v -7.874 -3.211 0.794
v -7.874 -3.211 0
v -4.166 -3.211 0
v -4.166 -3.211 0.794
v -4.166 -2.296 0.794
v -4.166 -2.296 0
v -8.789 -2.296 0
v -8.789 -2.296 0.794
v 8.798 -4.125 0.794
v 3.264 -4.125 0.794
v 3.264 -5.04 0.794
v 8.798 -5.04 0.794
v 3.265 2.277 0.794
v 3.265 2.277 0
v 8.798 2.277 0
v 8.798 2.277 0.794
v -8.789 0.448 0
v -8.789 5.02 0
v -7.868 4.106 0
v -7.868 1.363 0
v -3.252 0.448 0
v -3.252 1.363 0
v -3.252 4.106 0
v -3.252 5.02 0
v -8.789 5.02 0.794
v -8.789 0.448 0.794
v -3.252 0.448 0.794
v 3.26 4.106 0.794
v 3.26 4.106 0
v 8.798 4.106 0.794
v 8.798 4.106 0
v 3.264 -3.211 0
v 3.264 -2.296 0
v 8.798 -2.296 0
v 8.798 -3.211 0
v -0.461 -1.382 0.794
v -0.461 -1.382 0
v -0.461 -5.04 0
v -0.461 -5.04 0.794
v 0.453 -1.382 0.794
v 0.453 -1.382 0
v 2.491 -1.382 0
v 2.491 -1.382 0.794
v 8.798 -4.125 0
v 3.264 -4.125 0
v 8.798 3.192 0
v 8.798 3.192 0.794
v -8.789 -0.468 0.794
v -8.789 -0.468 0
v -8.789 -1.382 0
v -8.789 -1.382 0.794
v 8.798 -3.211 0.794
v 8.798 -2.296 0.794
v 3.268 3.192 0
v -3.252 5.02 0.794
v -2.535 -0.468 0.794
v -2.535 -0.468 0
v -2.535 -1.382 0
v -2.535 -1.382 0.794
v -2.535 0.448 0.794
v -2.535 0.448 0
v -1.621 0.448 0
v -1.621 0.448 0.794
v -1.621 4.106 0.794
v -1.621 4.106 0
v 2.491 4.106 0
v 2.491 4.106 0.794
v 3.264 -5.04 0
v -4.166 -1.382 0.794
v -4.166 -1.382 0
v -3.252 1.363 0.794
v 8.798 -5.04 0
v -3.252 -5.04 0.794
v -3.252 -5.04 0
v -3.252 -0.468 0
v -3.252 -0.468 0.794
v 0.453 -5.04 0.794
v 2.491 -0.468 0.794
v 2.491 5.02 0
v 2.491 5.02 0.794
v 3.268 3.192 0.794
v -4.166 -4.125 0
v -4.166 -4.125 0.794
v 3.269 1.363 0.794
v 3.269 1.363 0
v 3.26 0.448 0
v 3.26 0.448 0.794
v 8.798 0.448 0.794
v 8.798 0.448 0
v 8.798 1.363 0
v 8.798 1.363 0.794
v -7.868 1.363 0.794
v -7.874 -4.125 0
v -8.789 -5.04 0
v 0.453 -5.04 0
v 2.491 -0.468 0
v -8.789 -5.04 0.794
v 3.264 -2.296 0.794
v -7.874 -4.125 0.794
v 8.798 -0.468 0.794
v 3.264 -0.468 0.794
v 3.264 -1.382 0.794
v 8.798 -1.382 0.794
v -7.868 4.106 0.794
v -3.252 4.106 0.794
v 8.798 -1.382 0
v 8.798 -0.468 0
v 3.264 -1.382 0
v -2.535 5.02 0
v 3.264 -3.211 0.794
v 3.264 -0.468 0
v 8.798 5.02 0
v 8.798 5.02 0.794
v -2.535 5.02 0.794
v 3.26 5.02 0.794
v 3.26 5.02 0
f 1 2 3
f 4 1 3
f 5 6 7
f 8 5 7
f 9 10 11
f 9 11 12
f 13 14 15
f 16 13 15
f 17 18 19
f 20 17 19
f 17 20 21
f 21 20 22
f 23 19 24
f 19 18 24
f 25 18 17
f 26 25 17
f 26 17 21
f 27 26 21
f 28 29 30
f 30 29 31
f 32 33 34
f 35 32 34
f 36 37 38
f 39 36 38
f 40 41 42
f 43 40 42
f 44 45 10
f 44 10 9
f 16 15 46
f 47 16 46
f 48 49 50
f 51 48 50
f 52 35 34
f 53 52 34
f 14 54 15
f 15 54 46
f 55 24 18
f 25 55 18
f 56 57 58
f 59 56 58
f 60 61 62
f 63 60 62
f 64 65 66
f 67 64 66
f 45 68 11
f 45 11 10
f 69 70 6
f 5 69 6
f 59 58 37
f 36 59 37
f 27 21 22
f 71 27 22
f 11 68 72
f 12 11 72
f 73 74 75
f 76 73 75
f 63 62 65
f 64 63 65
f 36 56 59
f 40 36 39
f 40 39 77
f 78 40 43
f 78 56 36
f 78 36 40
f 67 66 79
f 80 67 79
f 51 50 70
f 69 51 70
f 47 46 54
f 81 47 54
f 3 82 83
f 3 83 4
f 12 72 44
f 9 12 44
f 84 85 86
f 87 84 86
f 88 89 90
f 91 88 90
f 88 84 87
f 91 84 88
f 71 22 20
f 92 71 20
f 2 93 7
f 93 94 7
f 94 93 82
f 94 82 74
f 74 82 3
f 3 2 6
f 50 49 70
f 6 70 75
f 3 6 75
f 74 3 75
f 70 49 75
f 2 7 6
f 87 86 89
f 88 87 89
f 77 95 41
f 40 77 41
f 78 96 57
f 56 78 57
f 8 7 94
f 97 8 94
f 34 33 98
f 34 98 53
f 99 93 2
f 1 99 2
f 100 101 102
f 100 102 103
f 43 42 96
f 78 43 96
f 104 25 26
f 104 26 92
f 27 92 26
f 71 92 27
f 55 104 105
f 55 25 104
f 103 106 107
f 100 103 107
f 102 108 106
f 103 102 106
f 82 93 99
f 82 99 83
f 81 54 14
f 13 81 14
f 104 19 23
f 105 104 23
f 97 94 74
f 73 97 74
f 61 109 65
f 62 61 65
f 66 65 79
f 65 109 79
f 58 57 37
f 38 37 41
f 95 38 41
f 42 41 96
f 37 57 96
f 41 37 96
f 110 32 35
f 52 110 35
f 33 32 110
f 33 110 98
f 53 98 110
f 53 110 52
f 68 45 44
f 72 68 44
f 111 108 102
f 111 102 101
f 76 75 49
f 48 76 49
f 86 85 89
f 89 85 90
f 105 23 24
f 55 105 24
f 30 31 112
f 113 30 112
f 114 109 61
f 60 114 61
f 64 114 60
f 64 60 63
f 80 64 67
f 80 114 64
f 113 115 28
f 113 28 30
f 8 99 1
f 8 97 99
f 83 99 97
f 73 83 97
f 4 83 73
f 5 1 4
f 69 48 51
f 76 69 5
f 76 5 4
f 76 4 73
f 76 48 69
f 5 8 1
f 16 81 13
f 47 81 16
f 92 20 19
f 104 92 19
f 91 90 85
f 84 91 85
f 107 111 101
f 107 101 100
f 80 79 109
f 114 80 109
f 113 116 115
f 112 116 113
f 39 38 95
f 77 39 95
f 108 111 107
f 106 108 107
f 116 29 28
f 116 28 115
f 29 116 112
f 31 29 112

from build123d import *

# Parameters (mm, degrees)
F1_DEPTH = 0.79375
F0_W     = 5.5372115393
F0_H     = 0.9144
F0_W_2   = 5.5339674
F0_W_3   = 3.7084


with BuildPart() as f1:
    # F0 (on Top) → F1 (new body)
    with BuildSketch(Plane.XY):
        Polygon((-3.2516753042, 5.020469915), (-8.7888753042, 5.020469915), (-8.7888753042, 0.448469915), (-3.2516753042, 0.448469915), (-3.2516753042, 1.362869915), (-7.8683095053, 1.362869915), (-7.8683095053, 4.106069915), (-3.2516753042, 4.106069915), align=None)
    extrude(amount=F1_DEPTH)


with BuildPart() as f1b:
    # F0 (on Top) → F1, piece 2 (new body)
    with BuildSketch(Plane.XY):
        Polygon((2.491109306, 5.020469915), (-2.5352544617, 5.020469915), (-2.5352544617, 0.448469915), (-1.6208544617, 0.448469915), (-1.6208544617, 4.106069915), (2.491109306, 4.106069915), align=None)
    extrude(amount=F1_DEPTH)


with BuildPart() as f1c:
    # F0 (on Top) → F1, piece 3 (new body)
    with BuildSketch(Plane.XY):
        with Locations((6.0289475982, 4.563269915)):
            Rectangle(F0_W, F0_H)
    extrude(amount=F1_DEPTH)


with BuildPart() as f1d:
    # F0 (on Top) → F1, piece 4 (new body)
    with BuildSketch(Plane.XY):
        Polygon((8.7975533679, 2.277269915), (8.7975533679, 3.191669915), (3.2679176269, 3.191669915), (3.2648988339, 2.277269915), align=None)
    extrude(amount=F1_DEPTH)


with BuildPart() as f1e:
    # F0 (on Top) → F1, piece 5 (new body)
    with BuildSketch(Plane.XY):
        Polygon((3.2603533679, 0.448469915), (8.7975533679, 0.448469915), (8.7975533679, 1.362869915), (3.2693795056, 1.362869915), align=None)
    extrude(amount=F1_DEPTH)


with BuildPart() as f1f:
    # F0 (on Top) → F1, piece 6 (new body)
    with BuildSketch(Plane.XY):
        with Locations((6.0305696679, -0.9248565126)):
            Rectangle(F0_W_2, F0_H)
    extrude(amount=F1_DEPTH)


with BuildPart() as f1g:
    # F0 (on Top) → F1, piece 7 (new body)
    with BuildSketch(Plane.XY):
        with Locations((6.0305696679, -2.7536565126)):
            Rectangle(F0_W_2, F0_H)
    extrude(amount=F1_DEPTH)


with BuildPart() as f1h:
    # F0 (on Top) → F1, piece 8 (new body)
    with BuildSketch(Plane.XY):
        with Locations((6.0305696679, -4.5824565126)):
            Rectangle(F0_W_2, F0_H)
    extrude(amount=F1_DEPTH)


with BuildPart() as f1i:
    # F0 (on Top) → F1, piece 9 (new body)
    with BuildSketch(Plane.XY):
        Polygon((2.491109306, -0.4676565126), (-2.5352544617, -0.4676565126), (-2.5352544617, -1.3820565126), (-0.4614913196, -1.3820565126), (-0.4614913196, -2.2964565126), (-0.4614913196, -3.2108565126), (0.4529086804, -3.2108565126), (0.4529086804, -2.2964565126), (0.4529086804, -1.3820565126), (2.491109306, -1.3820565126), align=None)
        Polygon((-0.4614913196, -4.1252565126), (-0.4614913196, -5.0396565126), (0.4529086804, -5.0396565126), (0.4529086804, -4.1252565126), (0.4529086804, -3.2108565126), (-0.4614913196, -3.2108565126), align=None)
    extrude(amount=F1_DEPTH)


with BuildPart() as f1j:
    # F0 (on Top) → F1, piece 10 (new body)
    with BuildSketch(Plane.XY):
        Polygon((-4.1660753042, -2.2964565126), (-8.7888753042, -2.2964565126), (-8.7888753042, -5.0396565126), (-3.2516753042, -5.0396565126), (-3.2516753042, -4.1252565126), (-3.2516753042, -3.2108565126), (-3.2516753042, -2.2964565126), align=None)
        with Locations((-6.0202753042, -3.6680565126)):
            Rectangle(F0_W_3, F0_H, mode=Mode.SUBTRACT)
        Polygon((-3.2516753042, -0.4676565126), (-8.7888753042, -0.4676565126), (-8.7888753042, -1.3820565126), (-4.1660753042, -1.3820565126), (-4.1660753042, -2.2964565126), (-3.2516753042, -2.2964565126), (-3.2516753042, -1.3820565126), align=None)
    extrude(amount=F1_DEPTH)


solid = Compound([f1.part, f1b.part, f1c.part, f1d.part, f1e.part, f1f.part, f1g.part, f1h.part, f1i.part, f1j.part])
